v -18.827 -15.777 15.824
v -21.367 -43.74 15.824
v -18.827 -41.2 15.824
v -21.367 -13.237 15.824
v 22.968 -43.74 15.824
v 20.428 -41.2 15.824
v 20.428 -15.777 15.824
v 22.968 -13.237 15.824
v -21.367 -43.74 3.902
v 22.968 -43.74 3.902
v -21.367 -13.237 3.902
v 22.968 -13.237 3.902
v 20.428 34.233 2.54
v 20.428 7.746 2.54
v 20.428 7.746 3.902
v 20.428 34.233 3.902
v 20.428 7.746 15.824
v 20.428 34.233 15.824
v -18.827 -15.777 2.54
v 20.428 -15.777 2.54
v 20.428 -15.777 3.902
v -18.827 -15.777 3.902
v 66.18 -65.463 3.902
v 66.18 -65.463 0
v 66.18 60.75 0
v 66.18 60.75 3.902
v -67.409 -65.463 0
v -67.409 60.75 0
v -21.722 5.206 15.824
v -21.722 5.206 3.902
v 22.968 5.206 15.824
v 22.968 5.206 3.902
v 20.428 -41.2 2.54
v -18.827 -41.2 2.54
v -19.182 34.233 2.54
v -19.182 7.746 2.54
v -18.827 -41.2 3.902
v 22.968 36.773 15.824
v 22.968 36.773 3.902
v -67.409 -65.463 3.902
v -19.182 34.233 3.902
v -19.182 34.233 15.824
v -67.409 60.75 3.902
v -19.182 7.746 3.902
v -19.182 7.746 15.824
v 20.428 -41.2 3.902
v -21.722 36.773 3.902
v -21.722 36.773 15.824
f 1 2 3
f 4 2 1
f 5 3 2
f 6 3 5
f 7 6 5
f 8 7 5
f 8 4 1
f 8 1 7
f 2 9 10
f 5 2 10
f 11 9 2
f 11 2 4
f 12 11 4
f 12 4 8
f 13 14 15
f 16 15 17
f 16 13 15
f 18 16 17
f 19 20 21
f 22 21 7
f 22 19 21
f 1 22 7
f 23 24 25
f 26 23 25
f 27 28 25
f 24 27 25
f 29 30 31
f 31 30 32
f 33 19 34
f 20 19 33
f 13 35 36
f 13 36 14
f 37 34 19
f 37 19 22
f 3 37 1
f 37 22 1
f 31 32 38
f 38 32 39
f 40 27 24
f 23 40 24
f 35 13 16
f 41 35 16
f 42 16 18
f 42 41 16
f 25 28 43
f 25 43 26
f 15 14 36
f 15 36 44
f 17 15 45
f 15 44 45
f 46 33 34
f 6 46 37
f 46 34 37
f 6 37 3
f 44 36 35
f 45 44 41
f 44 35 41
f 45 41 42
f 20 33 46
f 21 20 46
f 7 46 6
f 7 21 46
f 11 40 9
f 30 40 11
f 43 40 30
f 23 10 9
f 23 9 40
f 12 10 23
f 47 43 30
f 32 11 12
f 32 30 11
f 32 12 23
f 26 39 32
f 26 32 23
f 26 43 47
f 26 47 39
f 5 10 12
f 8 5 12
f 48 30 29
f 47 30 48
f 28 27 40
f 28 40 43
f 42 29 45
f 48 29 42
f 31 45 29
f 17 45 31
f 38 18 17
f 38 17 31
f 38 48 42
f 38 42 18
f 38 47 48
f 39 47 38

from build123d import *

# Parameters (mm, degrees)
F0_W        = 133.5890442133
F0_H        = 126.2129619718
F1_DEPTH    = 3.90208
F2_W        = 44.6898769587
F2_H        = 31.5666613169
F2_W_2      = 44.3351939321
F2_H_2      = 30.5026173592
F3_DEPTH    = 11.9221
F4_T        = 2.54
F4_T3_DEPTH = 49.4151939321
F4_T5_DEPTH = 35.5826173592
F4_T7_DEPTH = 49.7698769587
F4_T9_DEPTH = 36.6466613169


# Not quite as in the source:
# - a shell that OpenCascade refuses in one call is made with other operations: the cavity is built on its own and cut out


with BuildPart() as f1:
    # F0 (on Top) → F1 (new body)
    with BuildSketch(Plane.XY):
        with Locations((-0.6146728992, -2.3562498391)):
            Rectangle(F0_W, F0_H)
    extrude(amount=F1_DEPTH)

    # F2 (on face) → F3 (join)
    with BuildSketch(Plane.XY.offset(3.90208)):
        with Locations((0.623148866, 20.9897363093)):
            Rectangle(F2_W, F2_H)
        with Locations((0.8004903793, -28.4883454442)):
            Rectangle(F2_W_2, F2_H_2)
    extrude(amount=F3_DEPTH)

    # F4: shell of thickness 2.54, made by hand


with BuildPart() as f4_core1:
    # F4_t2: copy of F1
    add(f1.part)

    # the walls: a layer under each face that stays
    f4_faces = [f4_core1.faces().sort_by_distance(p)[0] for p in [
        (-0.6146728992, 60.7502311468, 1.95104),
        (66.1798492074, -2.3562498391, 1.95104),
        (-67.4091950059, -2.3562498391, 1.95104),
        (-0.6146728992, -2.3562498391, 0),
        (-0.6146728992, -2.3562498391, 3.90208),
        (-0.6146728992, -65.4627308249, 1.95104),
        (0.8004903793, -13.2370367646, 9.86313),
        (-21.3671065867, -28.4883454442, 9.86313),
        (0.8004903793, -43.7396541238, 9.86313),
        (22.9680873454, -28.4883454442, 9.86313),
        (0.623148866, 36.7730669677, 9.86313),
        (-21.7217896134, 20.9897363093, 9.86313),
        (0.623148866, 5.2064056508, 9.86313),
        (22.9680873454, 20.9897363093, 9.86313),
    ]]
    thicken(f4_faces, amount=-F4_T, mode=Mode.SUBTRACT)

    # F4_s4 → F4_t3 (cut)
    with BuildSketch(Plane.YZ.offset(-23.9071065867)):
        Polygon((-13.2116367646, 3.92748), (-13.2370367646, 1.36208), (-15.7770367646, 1.36208), (-15.7770367646, 3.90208), align=None)
        Polygon((-43.7650541238, 3.92748), (-43.7396541238, 1.36208), (-41.1996541238, 1.36208), (-41.1996541238, 3.90208), align=None)
    extrude(amount=F4_T3_DEPTH, mode=Mode.SUBTRACT)

    # F4_s6 → F4_t5 (cut)
    with BuildSketch(Plane.XZ.offset(10.6970367646)):
        Polygon((-21.3925065867, 3.92748), (-21.3671065867, 1.36208), (-18.8271065867, 1.36208), (-18.8271065867, 3.90208), align=None)
        Polygon((22.9934873454, 3.92748), (22.9680873454, 1.36208), (20.4280873454, 1.36208), (20.4280873454, 3.90208), align=None)
    extrude(amount=F4_T5_DEPTH, mode=Mode.SUBTRACT)

    # F4_s8 → F4_t7 (cut)
    with BuildSketch(Plane.YZ.offset(-24.2617896134)):
        Polygon((36.7984669677, 3.92748), (36.7730669677, 1.36208), (34.2330669677, 1.36208), (34.2330669677, 3.90208), align=None)
        Polygon((5.1810056508, 3.92748), (5.2064056508, 1.36208), (7.7464056508, 1.36208), (7.7464056508, 3.90208), align=None)
    extrude(amount=F4_T7_DEPTH, mode=Mode.SUBTRACT)

    # F4_s10 → F4_t9 (cut)
    with BuildSketch(Plane.XZ.offset(-39.3130669677)):
        Polygon((-21.7471896134, 3.92748), (-21.7217896134, 1.36208), (-19.1817896134, 1.36208), (-19.1817896134, 3.90208), align=None)
        Polygon((22.9934873454, 3.92748), (22.9680873454, 1.36208), (20.4280873454, 1.36208), (20.4280873454, 3.90208), align=None)
    extrude(amount=F4_T9_DEPTH, mode=Mode.SUBTRACT)


with BuildPart() as f1_1:
    add(f1.part)

    # what is left inside the walls is the cavity
    f4_cavity = [f4_core1.part.solids().sort_by_distance(p)[0] for p in [
        (0.80049, -32.725448, 2.5654),
        (0.623149, 16.575293, 2.5654),
    ]]
    add(f4_cavity, mode=Mode.SUBTRACT)


solid = f1_1.part
